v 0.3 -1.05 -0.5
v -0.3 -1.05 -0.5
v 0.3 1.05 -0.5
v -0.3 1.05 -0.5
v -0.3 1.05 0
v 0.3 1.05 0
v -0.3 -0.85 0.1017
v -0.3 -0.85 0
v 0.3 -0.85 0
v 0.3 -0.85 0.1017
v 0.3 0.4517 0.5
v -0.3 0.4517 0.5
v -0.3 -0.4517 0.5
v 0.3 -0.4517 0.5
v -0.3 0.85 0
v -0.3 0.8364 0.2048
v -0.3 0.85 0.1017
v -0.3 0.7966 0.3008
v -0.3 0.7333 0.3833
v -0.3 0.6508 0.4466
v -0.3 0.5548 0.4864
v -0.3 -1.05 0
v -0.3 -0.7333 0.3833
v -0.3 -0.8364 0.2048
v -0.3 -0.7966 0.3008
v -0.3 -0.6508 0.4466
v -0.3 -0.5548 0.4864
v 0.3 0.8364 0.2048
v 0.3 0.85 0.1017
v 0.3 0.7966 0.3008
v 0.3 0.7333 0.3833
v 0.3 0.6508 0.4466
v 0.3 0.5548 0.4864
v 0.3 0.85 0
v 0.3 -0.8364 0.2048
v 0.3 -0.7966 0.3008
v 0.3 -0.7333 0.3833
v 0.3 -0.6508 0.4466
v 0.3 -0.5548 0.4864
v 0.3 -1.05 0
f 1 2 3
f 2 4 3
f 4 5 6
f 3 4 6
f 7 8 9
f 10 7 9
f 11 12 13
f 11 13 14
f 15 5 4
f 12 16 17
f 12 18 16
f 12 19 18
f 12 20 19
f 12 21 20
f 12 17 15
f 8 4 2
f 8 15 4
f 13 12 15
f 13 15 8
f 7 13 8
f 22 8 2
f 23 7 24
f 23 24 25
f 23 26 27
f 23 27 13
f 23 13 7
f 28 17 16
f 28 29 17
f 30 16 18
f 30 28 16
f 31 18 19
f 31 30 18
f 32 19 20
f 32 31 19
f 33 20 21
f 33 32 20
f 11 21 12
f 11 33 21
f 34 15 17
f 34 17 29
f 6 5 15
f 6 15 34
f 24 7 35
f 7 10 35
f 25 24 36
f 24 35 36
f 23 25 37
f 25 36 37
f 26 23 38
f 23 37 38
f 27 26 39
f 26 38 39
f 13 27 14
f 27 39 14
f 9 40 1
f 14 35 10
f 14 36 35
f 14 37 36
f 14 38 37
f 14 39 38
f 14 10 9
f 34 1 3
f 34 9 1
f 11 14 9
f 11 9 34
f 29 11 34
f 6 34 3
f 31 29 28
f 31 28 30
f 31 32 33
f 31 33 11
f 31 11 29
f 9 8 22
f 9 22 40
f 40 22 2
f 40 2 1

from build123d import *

# Parameters (mm, degrees)
F0_W     = 0.6
F0_H     = 1.7
F0_H_2   = 0.2
F1_DEPTH = 0.5
F2_DEPTH = 0.5
F3_R     = 0.398345


with BuildPart() as f1:
    # F0 (on Top) → F1 (new body)
    with BuildSketch(Plane.XY):
        Rectangle(F0_W, F0_H)
        with Locations((0, -0.95)):
            Rectangle(F0_W, F0_H_2)
        with Locations((0, 0.95)):
            Rectangle(F0_W, F0_H_2)
    extrude(amount=-F1_DEPTH)

    # F0 (on Top) → F2 (join)
    with BuildSketch(Plane.XY):
        Rectangle(F0_W, F0_H)
    extrude(amount=F2_DEPTH)

    # F3
    f3_edges = [f1.edges().sort_by_distance(p)[0] for p in [
        (0, -0.85, 0.5),
        (0, 0.85, 0.5),
    ]]
    fillet(f3_edges, radius=F3_R)


solid = f1.part
